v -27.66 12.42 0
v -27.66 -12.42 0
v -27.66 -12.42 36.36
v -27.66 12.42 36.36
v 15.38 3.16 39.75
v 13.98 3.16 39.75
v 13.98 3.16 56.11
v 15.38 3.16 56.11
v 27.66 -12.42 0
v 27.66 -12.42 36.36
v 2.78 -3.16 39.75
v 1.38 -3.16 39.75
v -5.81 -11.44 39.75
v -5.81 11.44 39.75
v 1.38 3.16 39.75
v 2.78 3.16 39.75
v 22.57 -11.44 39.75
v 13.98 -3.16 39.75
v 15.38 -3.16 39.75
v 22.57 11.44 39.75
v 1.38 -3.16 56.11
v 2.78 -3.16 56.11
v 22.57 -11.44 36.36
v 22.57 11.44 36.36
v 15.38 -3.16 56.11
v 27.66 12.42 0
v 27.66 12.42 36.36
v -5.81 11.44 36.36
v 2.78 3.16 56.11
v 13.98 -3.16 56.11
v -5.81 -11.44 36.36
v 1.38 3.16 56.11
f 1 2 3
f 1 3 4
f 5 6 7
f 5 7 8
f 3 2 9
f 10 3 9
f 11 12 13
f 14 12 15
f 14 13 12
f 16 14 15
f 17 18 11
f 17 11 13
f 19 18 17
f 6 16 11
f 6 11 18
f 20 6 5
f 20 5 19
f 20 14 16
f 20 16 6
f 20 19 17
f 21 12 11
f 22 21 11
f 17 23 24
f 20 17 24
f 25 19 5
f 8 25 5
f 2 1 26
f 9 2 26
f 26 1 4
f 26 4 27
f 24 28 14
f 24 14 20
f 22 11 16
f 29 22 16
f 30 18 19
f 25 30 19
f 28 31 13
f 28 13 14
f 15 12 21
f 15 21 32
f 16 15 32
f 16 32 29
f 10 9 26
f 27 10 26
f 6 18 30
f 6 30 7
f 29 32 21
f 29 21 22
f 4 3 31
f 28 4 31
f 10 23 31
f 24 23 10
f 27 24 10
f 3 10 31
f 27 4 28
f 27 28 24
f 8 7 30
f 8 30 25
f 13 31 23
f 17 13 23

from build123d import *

# Parameters (mm, degrees)
SKETCH1_W           = 55.32
SKETCH1_H           = 24.84
BOSS_EXTRUDE1_DEPTH = 36.36
SKETCH2_W           = 28.38
SKETCH2_H           = 22.88
BOSS_EXTRUDE2_DEPTH = 3.39
SKETCH3_W           = 1.4
SKETCH3_H           = 6.32
BOSS_EXTRUDE3_DEPTH = 16.36


with BuildPart() as part:
    # Sketch1 → Boss-Extrude1 (new body)
    with BuildSketch(Plane.XY):
        Rectangle(SKETCH1_W, SKETCH1_H)
    extrude(amount=BOSS_EXTRUDE1_DEPTH)

    # Sketch2 → Boss-Extrude2 (add)
    with BuildSketch(Plane.XY.offset(36.36)):
        with Locations((8.38, 0)):
            Rectangle(SKETCH2_W, SKETCH2_H)
    extrude(amount=BOSS_EXTRUDE2_DEPTH)

    # Sketch3 → Boss-Extrude3 (add)
    with BuildSketch(Plane.XY.offset(39.75)):
        with Locations((14.68, 0)):
            Rectangle(SKETCH3_W, SKETCH3_H)
        with Locations((2.08, 0)):
            Rectangle(SKETCH3_W, SKETCH3_H)
    extrude(amount=BOSS_EXTRUDE3_DEPTH)


solid = part.part
